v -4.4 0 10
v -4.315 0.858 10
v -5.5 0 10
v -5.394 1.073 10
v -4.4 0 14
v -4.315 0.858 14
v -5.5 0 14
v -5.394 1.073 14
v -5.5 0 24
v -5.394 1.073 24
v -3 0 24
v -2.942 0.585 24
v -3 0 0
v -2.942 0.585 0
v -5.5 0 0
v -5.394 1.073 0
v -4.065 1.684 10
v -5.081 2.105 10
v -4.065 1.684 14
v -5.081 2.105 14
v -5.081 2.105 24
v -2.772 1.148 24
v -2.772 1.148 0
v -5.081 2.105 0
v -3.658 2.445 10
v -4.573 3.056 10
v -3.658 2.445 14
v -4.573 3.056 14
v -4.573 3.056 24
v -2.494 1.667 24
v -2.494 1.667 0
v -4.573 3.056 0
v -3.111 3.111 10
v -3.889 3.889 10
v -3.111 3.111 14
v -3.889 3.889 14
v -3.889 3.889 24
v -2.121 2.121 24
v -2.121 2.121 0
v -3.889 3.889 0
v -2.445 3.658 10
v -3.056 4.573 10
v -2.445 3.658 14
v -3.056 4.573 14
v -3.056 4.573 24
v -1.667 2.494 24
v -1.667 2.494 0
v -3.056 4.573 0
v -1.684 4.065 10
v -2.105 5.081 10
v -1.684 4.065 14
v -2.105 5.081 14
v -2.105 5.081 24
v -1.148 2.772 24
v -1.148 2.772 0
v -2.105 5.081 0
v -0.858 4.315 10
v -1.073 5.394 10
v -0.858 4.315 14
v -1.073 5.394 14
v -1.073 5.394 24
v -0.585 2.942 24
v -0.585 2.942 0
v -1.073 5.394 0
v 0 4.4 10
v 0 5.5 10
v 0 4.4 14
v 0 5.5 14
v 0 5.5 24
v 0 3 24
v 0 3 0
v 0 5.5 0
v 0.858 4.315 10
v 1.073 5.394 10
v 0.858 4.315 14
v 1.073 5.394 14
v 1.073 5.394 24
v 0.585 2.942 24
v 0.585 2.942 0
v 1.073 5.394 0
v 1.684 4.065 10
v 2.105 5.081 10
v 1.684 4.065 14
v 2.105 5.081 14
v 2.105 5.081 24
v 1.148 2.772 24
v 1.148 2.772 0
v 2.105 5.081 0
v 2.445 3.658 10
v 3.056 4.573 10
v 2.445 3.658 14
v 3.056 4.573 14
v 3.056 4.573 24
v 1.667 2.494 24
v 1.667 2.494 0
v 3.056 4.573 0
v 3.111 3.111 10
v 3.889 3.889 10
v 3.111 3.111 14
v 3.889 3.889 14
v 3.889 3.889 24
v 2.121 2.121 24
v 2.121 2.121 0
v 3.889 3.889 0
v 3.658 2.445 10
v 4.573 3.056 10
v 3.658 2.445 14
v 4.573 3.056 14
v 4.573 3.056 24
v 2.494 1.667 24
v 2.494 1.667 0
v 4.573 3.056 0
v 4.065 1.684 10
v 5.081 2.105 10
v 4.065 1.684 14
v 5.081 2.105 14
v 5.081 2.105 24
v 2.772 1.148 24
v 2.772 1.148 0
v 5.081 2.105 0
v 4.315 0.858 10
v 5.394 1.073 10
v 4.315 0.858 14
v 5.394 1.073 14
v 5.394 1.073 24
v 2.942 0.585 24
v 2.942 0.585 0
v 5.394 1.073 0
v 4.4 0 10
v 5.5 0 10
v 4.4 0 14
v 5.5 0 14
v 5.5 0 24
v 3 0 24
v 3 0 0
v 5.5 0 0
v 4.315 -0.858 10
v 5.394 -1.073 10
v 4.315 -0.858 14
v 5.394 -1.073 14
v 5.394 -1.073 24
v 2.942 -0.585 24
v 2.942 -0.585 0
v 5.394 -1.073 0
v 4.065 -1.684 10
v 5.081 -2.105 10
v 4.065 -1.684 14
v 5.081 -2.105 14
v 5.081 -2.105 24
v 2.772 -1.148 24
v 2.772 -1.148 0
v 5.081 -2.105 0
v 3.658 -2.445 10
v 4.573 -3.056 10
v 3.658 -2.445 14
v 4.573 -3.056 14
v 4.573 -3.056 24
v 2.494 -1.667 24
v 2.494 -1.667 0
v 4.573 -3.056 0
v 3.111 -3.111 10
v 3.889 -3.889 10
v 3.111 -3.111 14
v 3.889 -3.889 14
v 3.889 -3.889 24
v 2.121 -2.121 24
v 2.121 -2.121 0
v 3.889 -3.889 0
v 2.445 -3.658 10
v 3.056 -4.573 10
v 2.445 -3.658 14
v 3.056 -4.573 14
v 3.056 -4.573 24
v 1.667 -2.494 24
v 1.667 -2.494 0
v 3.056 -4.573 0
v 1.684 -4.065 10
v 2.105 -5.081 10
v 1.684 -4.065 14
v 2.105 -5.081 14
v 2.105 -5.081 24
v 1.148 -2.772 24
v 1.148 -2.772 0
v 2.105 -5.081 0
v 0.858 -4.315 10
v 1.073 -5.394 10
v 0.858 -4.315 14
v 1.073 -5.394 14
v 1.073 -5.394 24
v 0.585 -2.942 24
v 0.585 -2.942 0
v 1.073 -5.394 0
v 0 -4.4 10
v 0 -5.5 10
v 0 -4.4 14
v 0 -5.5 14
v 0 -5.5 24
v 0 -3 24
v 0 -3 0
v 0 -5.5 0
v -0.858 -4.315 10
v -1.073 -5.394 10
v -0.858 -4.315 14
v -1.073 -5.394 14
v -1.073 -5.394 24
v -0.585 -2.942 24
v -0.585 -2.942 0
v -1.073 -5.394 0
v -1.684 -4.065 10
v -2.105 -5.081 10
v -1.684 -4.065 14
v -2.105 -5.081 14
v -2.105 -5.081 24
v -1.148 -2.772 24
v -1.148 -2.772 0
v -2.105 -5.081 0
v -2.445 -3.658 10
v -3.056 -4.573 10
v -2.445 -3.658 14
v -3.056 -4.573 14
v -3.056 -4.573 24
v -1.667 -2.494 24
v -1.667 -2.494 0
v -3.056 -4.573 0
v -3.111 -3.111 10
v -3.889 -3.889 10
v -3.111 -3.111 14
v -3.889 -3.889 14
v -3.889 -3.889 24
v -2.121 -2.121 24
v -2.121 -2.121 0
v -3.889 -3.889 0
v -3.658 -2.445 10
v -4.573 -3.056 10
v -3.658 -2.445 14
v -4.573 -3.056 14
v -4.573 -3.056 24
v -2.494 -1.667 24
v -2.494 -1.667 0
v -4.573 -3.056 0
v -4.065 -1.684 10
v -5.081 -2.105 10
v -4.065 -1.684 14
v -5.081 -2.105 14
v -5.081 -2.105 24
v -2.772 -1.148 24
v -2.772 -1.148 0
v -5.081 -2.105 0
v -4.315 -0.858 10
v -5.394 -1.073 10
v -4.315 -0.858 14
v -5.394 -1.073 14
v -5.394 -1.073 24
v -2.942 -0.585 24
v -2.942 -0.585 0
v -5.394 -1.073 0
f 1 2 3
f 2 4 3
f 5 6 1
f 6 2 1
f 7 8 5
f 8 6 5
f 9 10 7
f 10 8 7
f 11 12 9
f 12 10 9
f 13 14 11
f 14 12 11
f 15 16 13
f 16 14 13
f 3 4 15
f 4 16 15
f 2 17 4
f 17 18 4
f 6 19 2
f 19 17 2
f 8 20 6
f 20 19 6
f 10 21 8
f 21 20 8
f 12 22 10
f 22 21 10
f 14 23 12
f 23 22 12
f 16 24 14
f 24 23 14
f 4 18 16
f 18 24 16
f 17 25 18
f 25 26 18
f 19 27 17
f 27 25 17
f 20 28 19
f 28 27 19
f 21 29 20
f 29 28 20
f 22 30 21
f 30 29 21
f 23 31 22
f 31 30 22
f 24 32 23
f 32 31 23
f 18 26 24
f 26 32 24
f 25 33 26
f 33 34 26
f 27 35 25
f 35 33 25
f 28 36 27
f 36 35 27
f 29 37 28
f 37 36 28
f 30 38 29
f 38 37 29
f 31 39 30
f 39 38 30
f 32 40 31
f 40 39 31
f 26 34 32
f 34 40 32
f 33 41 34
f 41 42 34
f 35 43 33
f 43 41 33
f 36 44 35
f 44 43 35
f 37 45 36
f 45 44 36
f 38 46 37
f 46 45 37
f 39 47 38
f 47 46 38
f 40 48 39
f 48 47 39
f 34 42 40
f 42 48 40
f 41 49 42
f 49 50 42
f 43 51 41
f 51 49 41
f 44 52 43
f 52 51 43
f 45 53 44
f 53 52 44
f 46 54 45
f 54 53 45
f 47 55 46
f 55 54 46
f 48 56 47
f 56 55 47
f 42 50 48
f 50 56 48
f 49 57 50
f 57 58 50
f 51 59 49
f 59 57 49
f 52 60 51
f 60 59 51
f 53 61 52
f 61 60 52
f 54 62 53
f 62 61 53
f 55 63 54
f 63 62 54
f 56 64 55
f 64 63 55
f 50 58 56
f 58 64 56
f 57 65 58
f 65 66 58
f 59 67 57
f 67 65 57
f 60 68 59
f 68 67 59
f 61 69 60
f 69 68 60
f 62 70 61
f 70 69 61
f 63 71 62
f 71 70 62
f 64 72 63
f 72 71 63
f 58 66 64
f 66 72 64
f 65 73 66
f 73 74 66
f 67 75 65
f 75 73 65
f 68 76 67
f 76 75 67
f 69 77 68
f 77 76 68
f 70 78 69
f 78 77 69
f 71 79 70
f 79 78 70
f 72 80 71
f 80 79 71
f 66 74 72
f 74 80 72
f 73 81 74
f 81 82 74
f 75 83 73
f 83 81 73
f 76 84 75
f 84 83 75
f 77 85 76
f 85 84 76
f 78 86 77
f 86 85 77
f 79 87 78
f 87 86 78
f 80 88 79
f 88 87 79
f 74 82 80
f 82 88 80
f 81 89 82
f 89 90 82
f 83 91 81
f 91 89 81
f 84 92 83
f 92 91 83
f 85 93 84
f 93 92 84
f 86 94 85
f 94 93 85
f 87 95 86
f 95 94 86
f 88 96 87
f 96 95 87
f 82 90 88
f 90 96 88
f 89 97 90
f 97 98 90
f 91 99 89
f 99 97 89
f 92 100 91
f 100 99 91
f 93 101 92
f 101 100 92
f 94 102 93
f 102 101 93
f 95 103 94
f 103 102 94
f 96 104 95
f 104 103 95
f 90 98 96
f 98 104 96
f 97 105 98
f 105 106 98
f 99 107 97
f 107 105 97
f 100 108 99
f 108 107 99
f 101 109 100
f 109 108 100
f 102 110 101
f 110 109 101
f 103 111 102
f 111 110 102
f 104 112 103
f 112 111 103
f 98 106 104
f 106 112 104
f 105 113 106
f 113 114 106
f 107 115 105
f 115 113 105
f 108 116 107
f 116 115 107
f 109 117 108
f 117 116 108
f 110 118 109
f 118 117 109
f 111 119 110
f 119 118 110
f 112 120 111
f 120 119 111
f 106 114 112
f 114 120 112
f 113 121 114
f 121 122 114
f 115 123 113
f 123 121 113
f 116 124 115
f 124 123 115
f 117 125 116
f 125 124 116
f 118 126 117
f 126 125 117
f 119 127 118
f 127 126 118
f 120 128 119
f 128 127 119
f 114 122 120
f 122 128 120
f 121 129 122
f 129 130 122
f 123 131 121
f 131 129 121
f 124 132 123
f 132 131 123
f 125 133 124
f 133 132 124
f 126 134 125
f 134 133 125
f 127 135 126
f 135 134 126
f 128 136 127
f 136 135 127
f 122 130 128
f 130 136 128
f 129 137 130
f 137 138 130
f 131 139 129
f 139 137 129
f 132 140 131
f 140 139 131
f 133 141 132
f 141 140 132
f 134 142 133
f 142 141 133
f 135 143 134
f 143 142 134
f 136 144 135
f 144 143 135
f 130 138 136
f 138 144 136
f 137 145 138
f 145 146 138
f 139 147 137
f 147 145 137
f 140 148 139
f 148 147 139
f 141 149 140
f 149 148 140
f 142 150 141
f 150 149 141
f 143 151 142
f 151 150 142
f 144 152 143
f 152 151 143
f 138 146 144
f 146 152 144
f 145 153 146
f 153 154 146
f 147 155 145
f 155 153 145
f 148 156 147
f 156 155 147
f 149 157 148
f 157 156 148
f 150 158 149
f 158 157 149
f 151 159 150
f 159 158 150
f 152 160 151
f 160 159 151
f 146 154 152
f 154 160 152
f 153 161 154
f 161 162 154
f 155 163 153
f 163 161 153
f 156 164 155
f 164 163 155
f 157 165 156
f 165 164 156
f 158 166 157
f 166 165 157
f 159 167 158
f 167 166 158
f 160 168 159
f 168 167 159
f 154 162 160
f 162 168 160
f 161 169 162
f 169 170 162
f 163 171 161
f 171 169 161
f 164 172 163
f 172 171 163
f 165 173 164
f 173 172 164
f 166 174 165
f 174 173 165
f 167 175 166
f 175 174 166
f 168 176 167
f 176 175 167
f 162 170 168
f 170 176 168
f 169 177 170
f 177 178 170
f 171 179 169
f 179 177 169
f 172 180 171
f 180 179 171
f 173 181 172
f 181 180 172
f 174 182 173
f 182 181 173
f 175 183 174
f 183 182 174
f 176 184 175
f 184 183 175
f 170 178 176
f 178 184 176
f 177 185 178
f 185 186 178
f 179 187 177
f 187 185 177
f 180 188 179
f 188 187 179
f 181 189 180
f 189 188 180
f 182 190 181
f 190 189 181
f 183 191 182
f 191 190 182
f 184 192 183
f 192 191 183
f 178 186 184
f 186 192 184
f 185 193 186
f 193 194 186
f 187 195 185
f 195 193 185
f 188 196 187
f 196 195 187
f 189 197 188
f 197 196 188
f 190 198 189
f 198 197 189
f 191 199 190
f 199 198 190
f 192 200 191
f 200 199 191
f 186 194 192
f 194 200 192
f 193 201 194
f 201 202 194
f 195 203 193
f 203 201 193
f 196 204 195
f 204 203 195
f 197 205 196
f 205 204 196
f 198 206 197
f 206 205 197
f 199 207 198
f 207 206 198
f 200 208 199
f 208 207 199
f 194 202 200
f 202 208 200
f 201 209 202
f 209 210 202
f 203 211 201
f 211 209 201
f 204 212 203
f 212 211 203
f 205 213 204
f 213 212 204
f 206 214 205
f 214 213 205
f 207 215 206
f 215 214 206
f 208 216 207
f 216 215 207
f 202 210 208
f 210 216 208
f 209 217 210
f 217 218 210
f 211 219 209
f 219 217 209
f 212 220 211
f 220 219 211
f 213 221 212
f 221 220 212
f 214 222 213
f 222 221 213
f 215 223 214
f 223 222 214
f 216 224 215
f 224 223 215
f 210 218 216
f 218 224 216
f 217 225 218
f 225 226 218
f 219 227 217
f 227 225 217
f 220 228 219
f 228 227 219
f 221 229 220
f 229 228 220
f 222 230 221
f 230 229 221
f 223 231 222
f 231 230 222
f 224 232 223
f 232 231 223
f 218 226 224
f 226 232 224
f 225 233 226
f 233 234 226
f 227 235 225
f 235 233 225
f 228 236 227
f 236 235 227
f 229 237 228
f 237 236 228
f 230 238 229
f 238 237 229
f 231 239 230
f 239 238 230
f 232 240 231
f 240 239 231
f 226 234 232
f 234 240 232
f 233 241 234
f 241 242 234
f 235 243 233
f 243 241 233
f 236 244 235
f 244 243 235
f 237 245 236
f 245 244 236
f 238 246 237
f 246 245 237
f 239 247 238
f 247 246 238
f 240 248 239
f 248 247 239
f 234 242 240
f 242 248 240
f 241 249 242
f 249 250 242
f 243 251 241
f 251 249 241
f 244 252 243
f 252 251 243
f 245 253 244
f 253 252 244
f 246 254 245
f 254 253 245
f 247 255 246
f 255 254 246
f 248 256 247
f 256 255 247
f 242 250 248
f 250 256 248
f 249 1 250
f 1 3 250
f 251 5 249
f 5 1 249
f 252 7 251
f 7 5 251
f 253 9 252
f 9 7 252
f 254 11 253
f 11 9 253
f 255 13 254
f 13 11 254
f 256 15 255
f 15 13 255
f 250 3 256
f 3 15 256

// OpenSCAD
$fn = 32;

// ----------------------------------------------------------------------
// Grooved revolve: stepped, bore R3
// ----------------------------------------------------------------------

// --- parameters (mm) ---
bore_r = 3;               // bore radius
outer_r = 5.5;            // outer radius of the body
total_h = 24;             // overall height, Z
wall = 2.5;               // radial wall thickness
groove_w = 4;             // groove width
groove_d = 1.1;           // groove depth
grooves = 1;              // number of outer grooves

bbox_x = 2 * outer_r;  // full diameter
bore_d = 2 * bore_r;  // bore diameter
body_d = 2 * outer_r;  // body diameter
revolve_angle = 360;  // full turn around the Z axis

profile = [[3, 0], [5.5, 0], [5.5, 10], [4.4, 10], [4.4, 14], [5.5, 14], [5.5, 24], [3, 24]];  // primary outline, 8 points, counter clockwise

// --- the one profile operation ---
rotate_extrude(angle = revolve_angle) polygon(points = profile);
